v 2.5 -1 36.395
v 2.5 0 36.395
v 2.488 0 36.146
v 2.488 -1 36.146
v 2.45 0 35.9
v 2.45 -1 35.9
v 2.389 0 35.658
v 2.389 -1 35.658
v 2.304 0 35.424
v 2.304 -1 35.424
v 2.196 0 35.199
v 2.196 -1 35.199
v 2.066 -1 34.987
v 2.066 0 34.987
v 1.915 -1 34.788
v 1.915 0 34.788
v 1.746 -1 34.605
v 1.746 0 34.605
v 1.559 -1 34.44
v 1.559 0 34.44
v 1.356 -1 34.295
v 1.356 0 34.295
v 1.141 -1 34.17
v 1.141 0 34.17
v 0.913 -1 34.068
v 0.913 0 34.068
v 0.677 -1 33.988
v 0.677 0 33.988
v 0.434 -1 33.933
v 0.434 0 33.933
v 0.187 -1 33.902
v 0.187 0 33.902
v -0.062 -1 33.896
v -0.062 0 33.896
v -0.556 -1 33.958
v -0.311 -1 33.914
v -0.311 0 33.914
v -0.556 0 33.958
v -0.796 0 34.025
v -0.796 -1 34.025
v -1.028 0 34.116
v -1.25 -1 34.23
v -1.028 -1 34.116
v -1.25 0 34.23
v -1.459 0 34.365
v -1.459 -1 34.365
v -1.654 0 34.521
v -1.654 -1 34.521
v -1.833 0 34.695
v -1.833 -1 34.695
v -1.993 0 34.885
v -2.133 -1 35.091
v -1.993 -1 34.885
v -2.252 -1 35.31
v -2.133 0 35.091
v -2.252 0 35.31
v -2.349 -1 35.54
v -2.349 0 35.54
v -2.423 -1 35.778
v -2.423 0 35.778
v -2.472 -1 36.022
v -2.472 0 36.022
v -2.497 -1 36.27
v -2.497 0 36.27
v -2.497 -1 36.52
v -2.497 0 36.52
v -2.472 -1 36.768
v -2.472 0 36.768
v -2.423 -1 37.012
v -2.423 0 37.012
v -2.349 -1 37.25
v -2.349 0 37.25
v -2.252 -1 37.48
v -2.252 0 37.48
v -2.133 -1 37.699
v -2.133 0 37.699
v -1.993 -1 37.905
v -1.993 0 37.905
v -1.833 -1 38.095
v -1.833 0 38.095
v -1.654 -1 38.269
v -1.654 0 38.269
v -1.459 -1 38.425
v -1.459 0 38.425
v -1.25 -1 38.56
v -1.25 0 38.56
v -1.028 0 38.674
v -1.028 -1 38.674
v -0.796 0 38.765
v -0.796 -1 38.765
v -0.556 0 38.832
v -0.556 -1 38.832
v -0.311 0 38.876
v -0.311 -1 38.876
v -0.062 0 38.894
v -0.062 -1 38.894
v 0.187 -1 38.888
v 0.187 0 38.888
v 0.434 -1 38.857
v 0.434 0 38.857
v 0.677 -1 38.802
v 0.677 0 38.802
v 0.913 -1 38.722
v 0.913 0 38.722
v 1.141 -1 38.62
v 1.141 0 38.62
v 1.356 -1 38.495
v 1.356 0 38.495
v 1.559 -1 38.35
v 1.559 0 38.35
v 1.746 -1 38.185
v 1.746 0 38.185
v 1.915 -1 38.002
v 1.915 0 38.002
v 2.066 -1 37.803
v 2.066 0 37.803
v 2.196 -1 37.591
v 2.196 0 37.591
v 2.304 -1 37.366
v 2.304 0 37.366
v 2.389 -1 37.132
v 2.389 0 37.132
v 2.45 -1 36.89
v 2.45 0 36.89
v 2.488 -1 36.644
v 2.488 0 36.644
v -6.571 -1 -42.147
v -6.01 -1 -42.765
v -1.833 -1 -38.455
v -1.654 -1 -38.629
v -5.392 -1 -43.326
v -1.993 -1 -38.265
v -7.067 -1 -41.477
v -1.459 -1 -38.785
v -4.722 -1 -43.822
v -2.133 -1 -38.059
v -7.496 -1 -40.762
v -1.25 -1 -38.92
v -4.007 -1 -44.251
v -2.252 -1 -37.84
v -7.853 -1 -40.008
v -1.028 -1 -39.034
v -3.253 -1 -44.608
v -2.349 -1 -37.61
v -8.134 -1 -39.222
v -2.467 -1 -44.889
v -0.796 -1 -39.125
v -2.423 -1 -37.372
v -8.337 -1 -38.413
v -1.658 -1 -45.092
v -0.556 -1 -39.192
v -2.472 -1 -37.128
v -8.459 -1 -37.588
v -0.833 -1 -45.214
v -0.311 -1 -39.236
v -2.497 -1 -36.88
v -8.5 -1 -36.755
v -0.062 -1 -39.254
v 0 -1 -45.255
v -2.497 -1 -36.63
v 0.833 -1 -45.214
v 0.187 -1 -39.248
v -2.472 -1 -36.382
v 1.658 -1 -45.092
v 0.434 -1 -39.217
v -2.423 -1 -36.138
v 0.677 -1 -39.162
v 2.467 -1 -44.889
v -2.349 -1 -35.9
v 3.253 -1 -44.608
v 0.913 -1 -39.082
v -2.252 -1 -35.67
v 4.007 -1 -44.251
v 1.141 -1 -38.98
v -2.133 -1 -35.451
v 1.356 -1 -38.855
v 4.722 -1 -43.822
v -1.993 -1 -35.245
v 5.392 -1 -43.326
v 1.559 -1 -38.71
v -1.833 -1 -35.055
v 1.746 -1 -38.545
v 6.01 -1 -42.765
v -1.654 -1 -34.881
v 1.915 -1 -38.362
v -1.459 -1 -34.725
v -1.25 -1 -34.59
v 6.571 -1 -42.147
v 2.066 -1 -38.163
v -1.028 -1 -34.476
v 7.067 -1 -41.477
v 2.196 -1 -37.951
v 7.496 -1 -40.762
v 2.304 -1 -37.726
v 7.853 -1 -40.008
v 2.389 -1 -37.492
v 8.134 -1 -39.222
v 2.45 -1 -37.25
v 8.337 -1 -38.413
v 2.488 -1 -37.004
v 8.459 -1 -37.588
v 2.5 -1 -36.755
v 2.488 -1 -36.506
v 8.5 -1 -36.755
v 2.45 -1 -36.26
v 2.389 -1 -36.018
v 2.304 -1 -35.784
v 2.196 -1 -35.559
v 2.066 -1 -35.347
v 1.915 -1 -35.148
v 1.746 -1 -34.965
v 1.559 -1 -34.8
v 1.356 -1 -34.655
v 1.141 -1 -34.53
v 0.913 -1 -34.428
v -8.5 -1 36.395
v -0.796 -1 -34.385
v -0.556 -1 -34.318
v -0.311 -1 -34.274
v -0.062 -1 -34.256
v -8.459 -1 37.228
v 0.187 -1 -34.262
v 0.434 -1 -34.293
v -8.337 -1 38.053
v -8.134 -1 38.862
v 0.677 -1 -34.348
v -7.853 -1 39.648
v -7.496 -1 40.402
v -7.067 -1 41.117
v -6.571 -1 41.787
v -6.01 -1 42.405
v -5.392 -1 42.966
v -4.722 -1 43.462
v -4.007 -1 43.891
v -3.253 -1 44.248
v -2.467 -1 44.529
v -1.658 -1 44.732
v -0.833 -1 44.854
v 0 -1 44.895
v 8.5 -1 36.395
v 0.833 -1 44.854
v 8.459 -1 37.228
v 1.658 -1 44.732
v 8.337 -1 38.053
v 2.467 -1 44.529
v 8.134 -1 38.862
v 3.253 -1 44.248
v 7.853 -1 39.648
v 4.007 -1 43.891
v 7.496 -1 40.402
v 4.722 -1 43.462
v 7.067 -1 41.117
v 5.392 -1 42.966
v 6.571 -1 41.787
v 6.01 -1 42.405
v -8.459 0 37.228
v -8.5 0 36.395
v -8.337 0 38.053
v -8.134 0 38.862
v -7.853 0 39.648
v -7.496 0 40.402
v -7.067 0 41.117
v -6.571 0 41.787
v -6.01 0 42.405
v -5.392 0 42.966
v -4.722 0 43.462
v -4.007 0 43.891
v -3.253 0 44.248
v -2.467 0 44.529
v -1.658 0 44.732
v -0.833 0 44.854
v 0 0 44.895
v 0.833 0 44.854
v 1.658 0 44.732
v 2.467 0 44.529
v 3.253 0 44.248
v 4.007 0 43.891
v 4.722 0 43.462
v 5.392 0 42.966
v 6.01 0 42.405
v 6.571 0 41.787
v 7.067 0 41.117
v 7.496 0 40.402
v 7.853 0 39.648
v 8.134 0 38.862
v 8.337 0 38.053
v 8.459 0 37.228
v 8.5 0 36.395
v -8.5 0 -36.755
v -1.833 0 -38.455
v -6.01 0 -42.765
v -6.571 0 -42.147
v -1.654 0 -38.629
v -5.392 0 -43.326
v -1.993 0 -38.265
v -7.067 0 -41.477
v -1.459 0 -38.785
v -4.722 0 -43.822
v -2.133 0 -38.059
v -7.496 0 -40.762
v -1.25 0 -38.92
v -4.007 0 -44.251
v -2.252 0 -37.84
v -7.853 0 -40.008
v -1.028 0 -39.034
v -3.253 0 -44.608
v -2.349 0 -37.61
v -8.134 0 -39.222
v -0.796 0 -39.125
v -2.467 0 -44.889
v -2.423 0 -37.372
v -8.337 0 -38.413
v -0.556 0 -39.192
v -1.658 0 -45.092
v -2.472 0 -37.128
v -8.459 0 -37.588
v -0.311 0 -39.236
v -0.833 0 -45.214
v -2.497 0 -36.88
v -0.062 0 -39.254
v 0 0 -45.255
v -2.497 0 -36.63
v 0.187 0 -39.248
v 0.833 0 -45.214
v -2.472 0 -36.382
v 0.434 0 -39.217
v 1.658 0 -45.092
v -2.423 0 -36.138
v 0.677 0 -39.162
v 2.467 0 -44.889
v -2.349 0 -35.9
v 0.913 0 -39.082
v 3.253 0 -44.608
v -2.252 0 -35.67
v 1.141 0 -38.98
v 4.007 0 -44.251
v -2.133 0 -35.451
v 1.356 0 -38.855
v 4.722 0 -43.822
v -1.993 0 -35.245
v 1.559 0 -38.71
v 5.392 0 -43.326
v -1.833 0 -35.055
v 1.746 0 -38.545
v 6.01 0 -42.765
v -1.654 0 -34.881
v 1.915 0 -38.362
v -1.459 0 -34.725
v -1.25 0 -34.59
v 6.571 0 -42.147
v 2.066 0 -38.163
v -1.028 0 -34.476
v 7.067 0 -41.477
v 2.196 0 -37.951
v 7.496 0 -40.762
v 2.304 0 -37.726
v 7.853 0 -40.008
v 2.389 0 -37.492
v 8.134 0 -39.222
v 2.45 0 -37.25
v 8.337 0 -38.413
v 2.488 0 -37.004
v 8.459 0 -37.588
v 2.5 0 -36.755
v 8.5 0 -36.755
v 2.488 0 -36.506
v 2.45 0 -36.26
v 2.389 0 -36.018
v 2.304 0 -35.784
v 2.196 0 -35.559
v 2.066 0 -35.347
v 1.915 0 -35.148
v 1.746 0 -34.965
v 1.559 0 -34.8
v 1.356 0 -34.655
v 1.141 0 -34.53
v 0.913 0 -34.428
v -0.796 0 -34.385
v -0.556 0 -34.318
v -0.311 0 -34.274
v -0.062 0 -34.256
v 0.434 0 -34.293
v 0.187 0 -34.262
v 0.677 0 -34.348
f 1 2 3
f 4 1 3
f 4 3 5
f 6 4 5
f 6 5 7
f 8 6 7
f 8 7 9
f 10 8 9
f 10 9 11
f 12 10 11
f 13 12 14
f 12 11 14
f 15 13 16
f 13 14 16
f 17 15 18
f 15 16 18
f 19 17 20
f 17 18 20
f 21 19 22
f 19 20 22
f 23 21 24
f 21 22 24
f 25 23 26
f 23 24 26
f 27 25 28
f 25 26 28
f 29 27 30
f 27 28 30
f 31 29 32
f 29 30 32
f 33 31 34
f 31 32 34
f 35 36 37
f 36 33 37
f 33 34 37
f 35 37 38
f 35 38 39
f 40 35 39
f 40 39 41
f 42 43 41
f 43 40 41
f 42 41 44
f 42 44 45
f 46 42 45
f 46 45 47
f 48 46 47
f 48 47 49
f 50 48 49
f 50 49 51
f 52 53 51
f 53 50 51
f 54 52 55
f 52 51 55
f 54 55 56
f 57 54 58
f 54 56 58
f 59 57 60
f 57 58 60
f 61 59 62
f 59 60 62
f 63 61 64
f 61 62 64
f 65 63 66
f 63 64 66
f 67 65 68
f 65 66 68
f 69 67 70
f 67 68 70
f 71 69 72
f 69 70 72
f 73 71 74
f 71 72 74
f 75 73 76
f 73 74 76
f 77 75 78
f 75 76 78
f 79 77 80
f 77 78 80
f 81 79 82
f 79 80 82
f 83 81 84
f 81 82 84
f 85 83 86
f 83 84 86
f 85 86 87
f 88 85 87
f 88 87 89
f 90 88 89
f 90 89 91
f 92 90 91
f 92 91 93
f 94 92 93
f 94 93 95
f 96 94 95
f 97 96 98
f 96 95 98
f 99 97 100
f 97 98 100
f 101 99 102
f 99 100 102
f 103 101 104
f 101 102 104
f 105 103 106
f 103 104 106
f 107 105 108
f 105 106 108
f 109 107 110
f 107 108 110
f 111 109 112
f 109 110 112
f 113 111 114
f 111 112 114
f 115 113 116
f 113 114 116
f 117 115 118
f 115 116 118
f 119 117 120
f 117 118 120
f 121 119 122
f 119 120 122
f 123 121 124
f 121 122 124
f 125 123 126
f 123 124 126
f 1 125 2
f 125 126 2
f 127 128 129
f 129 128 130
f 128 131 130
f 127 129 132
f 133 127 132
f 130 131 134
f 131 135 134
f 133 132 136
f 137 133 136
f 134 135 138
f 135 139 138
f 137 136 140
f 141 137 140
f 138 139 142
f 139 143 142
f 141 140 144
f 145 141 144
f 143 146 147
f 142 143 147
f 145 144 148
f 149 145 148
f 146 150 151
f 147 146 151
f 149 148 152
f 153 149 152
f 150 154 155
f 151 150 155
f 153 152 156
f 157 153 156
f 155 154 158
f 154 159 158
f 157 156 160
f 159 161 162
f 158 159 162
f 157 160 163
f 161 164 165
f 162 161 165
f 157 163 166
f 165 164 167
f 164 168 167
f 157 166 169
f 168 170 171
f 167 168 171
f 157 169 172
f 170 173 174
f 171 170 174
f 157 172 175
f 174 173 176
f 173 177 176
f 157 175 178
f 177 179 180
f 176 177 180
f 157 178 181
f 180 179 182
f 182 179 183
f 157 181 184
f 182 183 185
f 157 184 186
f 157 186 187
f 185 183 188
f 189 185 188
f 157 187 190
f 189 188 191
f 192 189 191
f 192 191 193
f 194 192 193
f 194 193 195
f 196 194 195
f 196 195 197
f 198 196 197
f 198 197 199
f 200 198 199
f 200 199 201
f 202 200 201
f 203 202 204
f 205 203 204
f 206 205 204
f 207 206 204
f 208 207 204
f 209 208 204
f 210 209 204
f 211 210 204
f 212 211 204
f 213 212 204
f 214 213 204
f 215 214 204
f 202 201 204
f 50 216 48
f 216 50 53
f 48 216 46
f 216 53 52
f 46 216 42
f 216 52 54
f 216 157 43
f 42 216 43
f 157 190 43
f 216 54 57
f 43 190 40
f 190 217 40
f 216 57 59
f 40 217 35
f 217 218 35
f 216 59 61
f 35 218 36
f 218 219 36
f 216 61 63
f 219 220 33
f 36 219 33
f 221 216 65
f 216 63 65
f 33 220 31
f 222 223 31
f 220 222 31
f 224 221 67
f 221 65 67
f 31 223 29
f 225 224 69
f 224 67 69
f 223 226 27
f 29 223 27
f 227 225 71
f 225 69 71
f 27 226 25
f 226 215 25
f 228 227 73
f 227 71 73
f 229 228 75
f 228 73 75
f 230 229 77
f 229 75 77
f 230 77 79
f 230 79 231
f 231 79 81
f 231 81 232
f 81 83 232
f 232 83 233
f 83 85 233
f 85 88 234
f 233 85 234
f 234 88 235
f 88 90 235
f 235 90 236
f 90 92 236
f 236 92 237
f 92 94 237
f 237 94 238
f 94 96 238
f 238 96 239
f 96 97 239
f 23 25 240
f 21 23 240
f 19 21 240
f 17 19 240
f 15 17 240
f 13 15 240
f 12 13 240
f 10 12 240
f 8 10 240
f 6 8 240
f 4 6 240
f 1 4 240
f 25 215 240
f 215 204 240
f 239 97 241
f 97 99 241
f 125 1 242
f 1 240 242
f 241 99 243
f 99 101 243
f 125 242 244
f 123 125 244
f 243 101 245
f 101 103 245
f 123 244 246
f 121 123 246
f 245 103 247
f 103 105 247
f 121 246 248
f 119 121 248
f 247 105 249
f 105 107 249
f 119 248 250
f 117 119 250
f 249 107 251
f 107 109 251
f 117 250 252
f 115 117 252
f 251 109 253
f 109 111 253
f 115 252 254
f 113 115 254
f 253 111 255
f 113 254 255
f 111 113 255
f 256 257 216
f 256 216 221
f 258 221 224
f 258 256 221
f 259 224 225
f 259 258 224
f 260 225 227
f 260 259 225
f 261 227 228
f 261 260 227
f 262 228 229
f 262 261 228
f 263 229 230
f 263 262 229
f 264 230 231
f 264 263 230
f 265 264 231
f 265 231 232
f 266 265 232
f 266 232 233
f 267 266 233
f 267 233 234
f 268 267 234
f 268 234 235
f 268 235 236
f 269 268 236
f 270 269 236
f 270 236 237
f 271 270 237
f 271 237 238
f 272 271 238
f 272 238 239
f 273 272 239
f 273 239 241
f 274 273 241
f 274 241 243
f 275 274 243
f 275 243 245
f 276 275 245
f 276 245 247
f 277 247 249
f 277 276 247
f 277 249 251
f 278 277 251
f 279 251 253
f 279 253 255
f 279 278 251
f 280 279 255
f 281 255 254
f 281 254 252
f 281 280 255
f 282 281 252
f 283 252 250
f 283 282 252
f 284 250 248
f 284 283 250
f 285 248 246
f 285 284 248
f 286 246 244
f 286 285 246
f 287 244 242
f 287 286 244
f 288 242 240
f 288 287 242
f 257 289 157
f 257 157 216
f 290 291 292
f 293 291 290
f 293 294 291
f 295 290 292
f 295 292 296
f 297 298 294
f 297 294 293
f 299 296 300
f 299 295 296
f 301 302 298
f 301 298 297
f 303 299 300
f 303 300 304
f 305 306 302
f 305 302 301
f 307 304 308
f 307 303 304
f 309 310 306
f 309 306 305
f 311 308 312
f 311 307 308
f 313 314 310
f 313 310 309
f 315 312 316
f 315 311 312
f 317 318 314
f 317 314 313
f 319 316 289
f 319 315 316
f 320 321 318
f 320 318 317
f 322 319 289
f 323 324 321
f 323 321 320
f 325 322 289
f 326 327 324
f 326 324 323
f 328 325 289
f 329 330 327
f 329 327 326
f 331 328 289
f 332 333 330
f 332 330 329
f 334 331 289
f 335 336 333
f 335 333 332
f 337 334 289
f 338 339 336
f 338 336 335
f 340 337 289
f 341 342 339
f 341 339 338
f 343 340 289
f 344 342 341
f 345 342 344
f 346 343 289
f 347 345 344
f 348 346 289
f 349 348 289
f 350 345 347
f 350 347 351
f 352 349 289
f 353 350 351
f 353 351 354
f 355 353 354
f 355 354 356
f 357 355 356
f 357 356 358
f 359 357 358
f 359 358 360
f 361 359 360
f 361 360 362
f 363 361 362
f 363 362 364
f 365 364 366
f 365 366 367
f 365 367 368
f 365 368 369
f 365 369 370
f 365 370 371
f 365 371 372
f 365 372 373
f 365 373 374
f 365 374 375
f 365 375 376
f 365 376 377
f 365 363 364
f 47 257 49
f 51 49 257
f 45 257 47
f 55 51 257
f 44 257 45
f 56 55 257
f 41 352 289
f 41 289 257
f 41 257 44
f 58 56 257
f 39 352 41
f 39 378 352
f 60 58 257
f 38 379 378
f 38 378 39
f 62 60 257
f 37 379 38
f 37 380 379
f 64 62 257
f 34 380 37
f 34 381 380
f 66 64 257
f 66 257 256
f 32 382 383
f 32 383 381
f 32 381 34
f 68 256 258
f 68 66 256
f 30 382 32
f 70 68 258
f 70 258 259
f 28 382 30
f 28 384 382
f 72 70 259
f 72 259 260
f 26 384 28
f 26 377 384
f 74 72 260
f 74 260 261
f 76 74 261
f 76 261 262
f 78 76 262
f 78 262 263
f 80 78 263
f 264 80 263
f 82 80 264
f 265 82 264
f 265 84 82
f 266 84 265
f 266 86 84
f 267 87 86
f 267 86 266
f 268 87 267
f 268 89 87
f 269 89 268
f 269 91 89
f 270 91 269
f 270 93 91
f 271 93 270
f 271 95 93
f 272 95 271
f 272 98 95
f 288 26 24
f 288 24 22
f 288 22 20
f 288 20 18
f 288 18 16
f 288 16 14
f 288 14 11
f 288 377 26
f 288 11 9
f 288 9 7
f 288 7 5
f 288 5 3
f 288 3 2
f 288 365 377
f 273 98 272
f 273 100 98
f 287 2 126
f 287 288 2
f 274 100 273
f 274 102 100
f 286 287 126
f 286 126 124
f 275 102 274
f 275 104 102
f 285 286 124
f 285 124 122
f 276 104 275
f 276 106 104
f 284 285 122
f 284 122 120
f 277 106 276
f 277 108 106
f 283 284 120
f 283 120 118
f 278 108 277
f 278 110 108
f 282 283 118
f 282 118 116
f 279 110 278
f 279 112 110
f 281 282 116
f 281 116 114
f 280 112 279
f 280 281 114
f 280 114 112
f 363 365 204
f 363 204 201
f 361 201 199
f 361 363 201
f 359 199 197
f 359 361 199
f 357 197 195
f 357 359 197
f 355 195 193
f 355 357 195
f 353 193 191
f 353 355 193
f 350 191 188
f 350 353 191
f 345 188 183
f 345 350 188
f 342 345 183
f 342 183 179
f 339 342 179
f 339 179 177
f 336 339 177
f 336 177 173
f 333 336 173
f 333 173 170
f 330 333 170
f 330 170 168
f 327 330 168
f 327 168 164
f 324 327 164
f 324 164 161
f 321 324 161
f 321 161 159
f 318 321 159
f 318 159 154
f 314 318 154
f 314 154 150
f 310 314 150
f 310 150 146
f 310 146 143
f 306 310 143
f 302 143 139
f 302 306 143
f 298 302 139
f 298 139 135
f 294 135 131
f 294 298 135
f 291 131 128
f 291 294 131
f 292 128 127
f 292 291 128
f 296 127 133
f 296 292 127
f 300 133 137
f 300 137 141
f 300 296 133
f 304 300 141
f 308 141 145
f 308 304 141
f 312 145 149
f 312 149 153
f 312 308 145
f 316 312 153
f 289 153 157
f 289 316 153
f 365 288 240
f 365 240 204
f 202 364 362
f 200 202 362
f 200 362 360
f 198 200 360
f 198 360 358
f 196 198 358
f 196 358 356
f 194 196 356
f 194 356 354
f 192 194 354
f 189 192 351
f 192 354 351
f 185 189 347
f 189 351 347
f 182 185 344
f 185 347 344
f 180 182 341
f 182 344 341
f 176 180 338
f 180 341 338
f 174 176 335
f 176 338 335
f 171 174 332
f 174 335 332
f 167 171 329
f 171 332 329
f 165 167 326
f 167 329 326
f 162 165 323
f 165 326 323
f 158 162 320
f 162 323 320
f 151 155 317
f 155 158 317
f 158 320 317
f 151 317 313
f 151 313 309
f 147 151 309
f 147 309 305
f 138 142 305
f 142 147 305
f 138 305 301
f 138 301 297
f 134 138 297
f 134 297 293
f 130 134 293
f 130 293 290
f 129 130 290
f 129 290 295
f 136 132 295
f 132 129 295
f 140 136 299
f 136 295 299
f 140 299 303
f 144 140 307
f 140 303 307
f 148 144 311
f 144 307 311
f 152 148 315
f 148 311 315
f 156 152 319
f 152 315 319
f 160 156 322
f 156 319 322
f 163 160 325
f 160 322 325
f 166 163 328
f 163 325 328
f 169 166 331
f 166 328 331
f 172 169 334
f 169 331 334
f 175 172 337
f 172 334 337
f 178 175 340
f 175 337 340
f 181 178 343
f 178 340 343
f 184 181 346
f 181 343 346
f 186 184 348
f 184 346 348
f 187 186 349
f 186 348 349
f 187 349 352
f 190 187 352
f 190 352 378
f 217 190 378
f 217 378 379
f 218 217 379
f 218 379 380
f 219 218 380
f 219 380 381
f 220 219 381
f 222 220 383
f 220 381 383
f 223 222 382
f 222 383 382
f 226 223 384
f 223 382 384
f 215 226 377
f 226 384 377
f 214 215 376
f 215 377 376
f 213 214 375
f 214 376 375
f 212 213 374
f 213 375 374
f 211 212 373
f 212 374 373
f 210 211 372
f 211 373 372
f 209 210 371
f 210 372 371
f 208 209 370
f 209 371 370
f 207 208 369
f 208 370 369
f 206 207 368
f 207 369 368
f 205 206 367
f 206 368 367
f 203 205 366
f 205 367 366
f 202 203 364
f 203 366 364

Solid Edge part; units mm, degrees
sketch "Sketch1" plane through (0, 0, 0) normal (0, -1, 0) x (1, 0, 0)
  circle A0 centre (0, 36.395) radius 2.5
  line L0 (-8.5, -36.755) -> (-8.5, 36.395)
  line L1 (8.5, 36.395) -> (8.5, -36.755)
  arc A1 (-8.5, 36.395) -> (8.5, 36.395) centre (0, 36.395) cw
  arc A2 (8.5, -36.755) -> (-8.5, -36.755) centre (0, -36.755) cw
  circle A3 centre (0, -36.755) radius 2.5
extrude "Protrusion1" add sketch "Sketch1" along normal blind 1
